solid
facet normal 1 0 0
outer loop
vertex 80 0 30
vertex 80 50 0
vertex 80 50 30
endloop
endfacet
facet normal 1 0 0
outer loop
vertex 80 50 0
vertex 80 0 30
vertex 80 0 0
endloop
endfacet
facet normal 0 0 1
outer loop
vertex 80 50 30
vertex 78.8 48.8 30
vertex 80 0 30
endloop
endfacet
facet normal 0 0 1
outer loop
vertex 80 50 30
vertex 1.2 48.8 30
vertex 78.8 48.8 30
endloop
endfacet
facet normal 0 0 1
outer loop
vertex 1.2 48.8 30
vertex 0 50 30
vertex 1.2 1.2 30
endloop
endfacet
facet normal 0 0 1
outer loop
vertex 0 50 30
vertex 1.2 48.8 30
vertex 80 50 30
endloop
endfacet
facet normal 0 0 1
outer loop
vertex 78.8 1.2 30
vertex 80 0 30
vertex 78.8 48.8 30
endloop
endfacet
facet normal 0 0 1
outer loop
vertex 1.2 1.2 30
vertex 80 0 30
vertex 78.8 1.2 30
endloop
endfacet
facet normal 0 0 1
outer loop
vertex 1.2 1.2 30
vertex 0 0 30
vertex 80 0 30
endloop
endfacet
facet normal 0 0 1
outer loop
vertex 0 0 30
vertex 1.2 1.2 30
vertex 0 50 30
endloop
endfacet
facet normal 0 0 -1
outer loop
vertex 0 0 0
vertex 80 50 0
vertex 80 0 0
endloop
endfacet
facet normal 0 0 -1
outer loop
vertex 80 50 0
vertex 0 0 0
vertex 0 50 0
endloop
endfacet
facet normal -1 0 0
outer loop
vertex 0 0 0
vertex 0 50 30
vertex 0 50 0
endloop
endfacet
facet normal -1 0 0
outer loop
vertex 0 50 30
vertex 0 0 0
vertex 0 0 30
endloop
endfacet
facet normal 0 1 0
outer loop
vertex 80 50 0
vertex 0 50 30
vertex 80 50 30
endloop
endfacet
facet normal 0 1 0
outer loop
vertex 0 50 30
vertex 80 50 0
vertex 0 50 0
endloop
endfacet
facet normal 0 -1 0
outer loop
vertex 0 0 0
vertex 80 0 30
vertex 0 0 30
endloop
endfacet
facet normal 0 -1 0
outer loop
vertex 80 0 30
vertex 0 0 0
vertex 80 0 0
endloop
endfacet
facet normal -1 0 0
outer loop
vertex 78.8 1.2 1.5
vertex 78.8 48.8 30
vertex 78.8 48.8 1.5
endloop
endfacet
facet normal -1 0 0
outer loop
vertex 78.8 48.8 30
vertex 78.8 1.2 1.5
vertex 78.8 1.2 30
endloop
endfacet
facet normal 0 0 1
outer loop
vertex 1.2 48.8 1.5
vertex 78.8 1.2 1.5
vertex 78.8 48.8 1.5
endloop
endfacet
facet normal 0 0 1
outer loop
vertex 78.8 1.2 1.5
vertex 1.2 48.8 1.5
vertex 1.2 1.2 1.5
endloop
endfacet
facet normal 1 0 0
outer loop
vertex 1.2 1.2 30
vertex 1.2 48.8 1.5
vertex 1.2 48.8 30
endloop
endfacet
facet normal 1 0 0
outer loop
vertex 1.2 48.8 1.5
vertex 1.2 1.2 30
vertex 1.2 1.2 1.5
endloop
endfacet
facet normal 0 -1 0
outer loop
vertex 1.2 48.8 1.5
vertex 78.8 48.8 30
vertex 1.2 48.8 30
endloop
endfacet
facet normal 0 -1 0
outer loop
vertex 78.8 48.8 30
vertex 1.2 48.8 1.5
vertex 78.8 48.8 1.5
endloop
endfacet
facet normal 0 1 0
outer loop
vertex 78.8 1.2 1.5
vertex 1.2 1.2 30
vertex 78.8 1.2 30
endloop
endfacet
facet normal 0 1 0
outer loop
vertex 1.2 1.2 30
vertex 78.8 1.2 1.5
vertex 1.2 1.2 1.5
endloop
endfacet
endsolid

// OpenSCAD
$fn = 32;

// ----------------------------------------------------------------------
// Open box: 1.2 mm walls
// ----------------------------------------------------------------------

// --- parameters (mm) ---
box_l = 80;               // outer length, X
box_w = 50;               // outer width, Y
box_h = 30;               // outer height, Z
wall = 1.2;               // wall thickness
floor = 1.5;              // floor thickness

difference() {
  cube([box_l, box_w, box_h]);
  translate([wall, wall, floor])
    cube([box_l - 2 * wall, box_w - 2 * wall, box_h]);
}
